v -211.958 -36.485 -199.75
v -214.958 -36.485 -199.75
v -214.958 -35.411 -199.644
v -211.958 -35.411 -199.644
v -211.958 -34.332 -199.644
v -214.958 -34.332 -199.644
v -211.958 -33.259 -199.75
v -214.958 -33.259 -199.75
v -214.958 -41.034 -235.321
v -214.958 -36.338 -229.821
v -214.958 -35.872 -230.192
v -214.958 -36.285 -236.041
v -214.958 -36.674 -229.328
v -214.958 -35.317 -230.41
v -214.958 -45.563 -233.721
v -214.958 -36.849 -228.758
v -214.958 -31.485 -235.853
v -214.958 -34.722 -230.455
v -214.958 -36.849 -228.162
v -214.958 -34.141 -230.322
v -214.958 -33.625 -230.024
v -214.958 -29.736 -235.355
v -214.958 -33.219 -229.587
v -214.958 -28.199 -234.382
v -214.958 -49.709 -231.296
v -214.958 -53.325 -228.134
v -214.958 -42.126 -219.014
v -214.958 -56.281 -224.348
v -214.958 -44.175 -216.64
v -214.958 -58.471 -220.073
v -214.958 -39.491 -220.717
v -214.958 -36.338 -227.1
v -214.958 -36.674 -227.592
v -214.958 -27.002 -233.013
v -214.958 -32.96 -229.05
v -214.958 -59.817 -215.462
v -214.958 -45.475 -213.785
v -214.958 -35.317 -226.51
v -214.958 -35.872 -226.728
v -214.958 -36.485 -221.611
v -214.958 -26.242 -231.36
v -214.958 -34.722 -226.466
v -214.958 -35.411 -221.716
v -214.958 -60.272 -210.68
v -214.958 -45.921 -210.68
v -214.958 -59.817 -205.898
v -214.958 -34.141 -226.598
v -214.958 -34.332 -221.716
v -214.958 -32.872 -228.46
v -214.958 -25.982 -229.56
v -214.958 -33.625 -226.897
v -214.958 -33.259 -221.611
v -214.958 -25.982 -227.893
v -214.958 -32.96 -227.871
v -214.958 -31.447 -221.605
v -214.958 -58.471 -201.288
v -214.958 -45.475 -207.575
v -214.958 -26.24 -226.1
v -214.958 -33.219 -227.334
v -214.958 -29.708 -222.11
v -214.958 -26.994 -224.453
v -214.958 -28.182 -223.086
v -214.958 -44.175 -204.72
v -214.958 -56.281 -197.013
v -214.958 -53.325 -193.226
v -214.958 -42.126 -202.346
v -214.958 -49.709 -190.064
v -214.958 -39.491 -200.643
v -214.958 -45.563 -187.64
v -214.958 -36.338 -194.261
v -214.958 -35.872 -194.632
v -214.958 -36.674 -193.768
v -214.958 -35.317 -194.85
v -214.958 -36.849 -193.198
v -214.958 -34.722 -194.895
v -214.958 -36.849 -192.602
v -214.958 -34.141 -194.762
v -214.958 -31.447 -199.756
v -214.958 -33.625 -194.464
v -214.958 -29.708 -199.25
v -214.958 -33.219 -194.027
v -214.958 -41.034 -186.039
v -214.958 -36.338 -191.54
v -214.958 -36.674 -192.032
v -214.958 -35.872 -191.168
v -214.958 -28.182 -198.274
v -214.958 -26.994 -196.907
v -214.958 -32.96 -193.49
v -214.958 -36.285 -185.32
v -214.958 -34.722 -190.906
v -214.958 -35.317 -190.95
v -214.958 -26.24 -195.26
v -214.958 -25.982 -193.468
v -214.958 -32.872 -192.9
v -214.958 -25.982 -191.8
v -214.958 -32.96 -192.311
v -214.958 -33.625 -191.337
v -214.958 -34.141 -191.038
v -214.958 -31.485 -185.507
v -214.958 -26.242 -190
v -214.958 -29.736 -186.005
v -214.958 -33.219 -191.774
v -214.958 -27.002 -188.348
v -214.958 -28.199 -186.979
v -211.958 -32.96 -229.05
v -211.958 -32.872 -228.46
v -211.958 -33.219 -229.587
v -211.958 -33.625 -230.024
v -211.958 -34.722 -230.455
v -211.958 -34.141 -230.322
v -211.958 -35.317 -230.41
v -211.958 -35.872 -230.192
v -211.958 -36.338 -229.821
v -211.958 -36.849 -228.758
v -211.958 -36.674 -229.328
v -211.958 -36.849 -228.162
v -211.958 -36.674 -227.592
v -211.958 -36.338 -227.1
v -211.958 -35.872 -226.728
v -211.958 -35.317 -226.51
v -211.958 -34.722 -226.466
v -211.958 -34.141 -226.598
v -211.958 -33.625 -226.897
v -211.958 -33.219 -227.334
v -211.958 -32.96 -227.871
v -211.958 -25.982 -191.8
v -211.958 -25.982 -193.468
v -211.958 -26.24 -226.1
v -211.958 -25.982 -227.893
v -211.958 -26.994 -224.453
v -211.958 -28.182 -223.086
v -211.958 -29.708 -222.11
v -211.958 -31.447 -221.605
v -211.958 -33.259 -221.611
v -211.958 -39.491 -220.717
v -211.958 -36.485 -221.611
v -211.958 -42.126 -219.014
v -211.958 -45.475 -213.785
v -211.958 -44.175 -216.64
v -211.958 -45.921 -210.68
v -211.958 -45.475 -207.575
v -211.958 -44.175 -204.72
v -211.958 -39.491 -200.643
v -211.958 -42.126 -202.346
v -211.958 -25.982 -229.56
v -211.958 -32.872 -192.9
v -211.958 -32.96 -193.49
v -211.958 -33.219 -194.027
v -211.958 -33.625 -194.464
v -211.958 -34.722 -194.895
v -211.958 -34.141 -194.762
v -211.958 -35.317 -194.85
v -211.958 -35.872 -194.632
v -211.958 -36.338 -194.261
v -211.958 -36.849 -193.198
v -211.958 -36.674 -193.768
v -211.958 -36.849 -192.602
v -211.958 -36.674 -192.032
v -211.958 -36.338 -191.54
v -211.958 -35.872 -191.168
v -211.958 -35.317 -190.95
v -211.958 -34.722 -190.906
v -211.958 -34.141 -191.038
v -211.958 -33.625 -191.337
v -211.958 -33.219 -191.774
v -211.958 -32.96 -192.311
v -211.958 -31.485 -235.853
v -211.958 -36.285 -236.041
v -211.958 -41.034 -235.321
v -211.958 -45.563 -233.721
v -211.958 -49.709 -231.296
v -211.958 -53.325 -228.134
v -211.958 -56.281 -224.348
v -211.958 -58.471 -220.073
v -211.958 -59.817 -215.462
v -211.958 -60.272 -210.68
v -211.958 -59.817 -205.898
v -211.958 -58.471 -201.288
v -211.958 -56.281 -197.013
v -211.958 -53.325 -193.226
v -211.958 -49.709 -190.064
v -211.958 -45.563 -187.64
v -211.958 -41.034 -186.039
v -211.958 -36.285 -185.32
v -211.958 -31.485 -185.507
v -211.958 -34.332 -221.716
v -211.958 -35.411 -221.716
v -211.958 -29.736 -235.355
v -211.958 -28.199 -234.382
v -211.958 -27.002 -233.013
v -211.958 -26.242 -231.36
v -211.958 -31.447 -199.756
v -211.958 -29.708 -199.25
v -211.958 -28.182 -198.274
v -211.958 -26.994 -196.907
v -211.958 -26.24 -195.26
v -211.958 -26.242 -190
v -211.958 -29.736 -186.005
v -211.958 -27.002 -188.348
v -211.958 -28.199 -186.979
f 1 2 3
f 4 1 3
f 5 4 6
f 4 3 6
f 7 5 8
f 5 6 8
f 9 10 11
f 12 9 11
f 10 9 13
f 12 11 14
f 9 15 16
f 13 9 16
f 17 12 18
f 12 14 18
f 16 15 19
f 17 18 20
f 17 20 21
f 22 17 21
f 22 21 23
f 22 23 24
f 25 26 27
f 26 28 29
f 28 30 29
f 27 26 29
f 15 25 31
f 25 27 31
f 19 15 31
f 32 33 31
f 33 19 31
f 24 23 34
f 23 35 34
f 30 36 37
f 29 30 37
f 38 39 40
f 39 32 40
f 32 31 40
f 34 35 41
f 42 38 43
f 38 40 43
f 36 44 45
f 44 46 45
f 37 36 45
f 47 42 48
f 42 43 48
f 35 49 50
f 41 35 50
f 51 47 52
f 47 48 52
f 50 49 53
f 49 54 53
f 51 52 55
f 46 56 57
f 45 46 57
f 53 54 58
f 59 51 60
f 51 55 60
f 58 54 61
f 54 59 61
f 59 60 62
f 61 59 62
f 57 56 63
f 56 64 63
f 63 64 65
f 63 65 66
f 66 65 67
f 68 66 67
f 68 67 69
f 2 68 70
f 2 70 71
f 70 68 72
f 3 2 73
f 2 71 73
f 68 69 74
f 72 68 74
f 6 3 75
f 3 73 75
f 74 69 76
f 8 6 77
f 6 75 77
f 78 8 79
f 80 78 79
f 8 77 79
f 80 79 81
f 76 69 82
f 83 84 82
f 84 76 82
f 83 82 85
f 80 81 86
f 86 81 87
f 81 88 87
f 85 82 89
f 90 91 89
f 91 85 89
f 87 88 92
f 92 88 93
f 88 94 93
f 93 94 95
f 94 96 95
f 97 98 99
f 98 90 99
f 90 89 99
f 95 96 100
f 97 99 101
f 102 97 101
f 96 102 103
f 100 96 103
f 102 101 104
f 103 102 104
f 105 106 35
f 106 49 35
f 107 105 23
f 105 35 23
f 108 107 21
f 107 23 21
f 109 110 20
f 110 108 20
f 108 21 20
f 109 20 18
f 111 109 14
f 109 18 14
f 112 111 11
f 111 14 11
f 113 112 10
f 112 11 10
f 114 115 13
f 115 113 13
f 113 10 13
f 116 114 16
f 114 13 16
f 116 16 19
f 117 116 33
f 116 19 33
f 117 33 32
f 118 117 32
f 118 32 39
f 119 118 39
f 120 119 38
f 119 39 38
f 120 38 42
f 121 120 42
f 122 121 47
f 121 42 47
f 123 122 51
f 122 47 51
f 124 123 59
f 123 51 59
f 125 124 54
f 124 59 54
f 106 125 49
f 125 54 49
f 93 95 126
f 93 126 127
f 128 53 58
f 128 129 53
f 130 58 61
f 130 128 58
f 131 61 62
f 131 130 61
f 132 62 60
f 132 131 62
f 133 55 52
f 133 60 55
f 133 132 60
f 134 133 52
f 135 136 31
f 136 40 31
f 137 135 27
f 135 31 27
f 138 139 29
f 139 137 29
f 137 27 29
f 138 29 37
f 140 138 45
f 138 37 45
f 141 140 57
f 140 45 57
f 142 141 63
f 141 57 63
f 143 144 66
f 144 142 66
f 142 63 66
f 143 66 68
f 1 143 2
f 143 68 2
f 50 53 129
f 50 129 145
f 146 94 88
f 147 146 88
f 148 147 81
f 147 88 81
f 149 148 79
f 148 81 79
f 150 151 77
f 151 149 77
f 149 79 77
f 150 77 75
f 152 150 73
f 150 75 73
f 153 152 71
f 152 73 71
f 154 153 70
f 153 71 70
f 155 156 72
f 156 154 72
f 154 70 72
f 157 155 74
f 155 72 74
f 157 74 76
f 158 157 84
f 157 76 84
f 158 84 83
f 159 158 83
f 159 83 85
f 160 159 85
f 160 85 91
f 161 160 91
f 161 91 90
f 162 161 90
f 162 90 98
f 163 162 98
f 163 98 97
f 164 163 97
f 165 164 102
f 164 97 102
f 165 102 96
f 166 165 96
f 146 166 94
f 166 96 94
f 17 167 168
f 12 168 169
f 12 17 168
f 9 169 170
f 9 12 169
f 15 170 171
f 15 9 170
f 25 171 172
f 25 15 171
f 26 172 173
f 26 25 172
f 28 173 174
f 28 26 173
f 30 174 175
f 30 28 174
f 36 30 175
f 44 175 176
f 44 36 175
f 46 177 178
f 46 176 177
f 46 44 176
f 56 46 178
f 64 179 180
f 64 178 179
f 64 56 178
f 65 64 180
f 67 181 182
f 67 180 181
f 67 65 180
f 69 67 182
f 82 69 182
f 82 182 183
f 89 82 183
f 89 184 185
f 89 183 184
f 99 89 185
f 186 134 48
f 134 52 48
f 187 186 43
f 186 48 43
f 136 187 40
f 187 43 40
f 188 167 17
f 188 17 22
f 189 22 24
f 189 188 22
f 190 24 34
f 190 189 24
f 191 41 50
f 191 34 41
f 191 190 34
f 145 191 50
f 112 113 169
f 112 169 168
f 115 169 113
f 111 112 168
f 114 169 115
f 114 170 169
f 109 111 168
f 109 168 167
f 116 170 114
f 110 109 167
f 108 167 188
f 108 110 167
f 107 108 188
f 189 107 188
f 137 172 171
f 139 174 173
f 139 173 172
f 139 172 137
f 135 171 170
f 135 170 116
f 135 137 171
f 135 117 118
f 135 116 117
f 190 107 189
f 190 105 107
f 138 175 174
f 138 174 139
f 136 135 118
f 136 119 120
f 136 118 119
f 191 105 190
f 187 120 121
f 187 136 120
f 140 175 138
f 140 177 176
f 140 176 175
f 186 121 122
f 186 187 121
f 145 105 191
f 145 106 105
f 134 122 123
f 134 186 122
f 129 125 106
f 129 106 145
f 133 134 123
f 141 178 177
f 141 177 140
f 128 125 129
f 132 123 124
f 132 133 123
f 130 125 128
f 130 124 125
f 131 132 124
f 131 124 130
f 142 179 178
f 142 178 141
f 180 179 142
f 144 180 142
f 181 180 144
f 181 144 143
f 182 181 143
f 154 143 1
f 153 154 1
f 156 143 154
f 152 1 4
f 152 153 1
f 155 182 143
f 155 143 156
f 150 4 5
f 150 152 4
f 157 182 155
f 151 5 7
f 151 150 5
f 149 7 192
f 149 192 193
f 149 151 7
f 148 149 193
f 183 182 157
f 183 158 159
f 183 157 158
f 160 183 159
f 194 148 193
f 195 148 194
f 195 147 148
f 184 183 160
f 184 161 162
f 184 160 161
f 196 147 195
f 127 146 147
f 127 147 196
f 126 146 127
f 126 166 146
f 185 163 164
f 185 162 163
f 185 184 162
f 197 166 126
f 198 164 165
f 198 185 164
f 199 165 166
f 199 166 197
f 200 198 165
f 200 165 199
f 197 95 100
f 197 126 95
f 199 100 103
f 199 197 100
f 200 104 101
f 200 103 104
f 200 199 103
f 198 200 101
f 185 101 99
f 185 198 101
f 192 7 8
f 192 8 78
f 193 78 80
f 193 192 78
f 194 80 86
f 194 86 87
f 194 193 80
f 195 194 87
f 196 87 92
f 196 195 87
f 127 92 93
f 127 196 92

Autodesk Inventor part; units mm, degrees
ref_plane "YZ Plane" through (0, 0, 0) normal (1, 0, 0) x (0, 1, 0)
ref_plane "XZ Plane" through (0, 0, 0) normal (0, 1, 0) x (-1, 0, 0)
ref_plane "XY Plane" through (0, 0, 0) normal (0, 0, 1) x (1, 0, 0)
ref_plane "Work Plane1" through (-214.9581, 261.0384, -210.6802) normal (1, 0, 0) x (0, 1, 0)
sketch "Sketch1" plane through (-214.9581, 261.0384, -210.6802) normal (1, 0, 0) x (0, 1, 0)
  arc A0 (-304.8, -19.05) -> (-298.45, -25.4) centre (-298.45, -19.05) ccw projected
  line L0 (-298.45, -25.4) -> (304.8, -25.4) projected
  line L1 (304.8, -25.4) -> (304.8, 25.4) projected
  line L2 (304.8, 25.4) -> (-298.45, 25.4) projected
  arc A1 (-298.45, 25.4) -> (-304.8, 19.05) centre (-298.45, 19.05) ccw projected
  line L3 (-304.8, 19.05) -> (-304.8, 17.2126) projected
  arc A2 (-304.8, 17.2126) -> (-297.523, 10.9306) centre (-298.45, 17.2126) ccw projected
  arc A3 (-297.523, -10.9306) -> (-297.523, 10.9306) centre (-295.91, 0) ccw projected
  arc A4 (-297.523, -10.9306) -> (-304.8, -17.2126) centre (-298.45, -17.2126) ccw projected
  line L4 (-304.8, -17.2126) -> (-304.8, -19.05) projected
  circle A5 centre (-295.91, 17.78) radius 2 projected
  circle A6 centre (-295.91, -17.78) radius 2 projected
  circle A7 centre (292.1, 12.7) radius 2 projected
  circle A8 centre (292.1, -12.7) radius 2 projected
  circle A9 centre (266.7, 12.7) radius 2 projected
  circle A10 centre (266.7, -12.7) radius 2 projected
  circle A11 centre (-295.91, 0) radius 11.049
  circle A12 centre (-295.91, 0) radius 25.4
  line L5 (-287.02, 23.7934) -> (-287.02, -23.7934)
  point P0 (-261.0384, 210.6802)
  point P1 (-287.02, 6.5611)
  point P2 (-287.02, -6.5611)
  point P3 (-297.523, -10.9306)
  dimension "d0" = 17.78
extrude "Extrusion1" add sketch "Sketch1" along normal blind 3 contours L4 A4 A3 L5 A12 A0 | A0 A12 A1 L3 A2 A11 A4 L4 | A12 L5 A3 A2 L3 A1
fillet "Fillet1" radius 6.35 4 edges at (-213.4581, -25.9816, -186.8868) (-213.4581, -25.9816, -217.2413) (-213.4581, -25.9816, -204.1191) (-213.4581, -25.9816, -234.4736)
properties part number "DropBarJoint"
